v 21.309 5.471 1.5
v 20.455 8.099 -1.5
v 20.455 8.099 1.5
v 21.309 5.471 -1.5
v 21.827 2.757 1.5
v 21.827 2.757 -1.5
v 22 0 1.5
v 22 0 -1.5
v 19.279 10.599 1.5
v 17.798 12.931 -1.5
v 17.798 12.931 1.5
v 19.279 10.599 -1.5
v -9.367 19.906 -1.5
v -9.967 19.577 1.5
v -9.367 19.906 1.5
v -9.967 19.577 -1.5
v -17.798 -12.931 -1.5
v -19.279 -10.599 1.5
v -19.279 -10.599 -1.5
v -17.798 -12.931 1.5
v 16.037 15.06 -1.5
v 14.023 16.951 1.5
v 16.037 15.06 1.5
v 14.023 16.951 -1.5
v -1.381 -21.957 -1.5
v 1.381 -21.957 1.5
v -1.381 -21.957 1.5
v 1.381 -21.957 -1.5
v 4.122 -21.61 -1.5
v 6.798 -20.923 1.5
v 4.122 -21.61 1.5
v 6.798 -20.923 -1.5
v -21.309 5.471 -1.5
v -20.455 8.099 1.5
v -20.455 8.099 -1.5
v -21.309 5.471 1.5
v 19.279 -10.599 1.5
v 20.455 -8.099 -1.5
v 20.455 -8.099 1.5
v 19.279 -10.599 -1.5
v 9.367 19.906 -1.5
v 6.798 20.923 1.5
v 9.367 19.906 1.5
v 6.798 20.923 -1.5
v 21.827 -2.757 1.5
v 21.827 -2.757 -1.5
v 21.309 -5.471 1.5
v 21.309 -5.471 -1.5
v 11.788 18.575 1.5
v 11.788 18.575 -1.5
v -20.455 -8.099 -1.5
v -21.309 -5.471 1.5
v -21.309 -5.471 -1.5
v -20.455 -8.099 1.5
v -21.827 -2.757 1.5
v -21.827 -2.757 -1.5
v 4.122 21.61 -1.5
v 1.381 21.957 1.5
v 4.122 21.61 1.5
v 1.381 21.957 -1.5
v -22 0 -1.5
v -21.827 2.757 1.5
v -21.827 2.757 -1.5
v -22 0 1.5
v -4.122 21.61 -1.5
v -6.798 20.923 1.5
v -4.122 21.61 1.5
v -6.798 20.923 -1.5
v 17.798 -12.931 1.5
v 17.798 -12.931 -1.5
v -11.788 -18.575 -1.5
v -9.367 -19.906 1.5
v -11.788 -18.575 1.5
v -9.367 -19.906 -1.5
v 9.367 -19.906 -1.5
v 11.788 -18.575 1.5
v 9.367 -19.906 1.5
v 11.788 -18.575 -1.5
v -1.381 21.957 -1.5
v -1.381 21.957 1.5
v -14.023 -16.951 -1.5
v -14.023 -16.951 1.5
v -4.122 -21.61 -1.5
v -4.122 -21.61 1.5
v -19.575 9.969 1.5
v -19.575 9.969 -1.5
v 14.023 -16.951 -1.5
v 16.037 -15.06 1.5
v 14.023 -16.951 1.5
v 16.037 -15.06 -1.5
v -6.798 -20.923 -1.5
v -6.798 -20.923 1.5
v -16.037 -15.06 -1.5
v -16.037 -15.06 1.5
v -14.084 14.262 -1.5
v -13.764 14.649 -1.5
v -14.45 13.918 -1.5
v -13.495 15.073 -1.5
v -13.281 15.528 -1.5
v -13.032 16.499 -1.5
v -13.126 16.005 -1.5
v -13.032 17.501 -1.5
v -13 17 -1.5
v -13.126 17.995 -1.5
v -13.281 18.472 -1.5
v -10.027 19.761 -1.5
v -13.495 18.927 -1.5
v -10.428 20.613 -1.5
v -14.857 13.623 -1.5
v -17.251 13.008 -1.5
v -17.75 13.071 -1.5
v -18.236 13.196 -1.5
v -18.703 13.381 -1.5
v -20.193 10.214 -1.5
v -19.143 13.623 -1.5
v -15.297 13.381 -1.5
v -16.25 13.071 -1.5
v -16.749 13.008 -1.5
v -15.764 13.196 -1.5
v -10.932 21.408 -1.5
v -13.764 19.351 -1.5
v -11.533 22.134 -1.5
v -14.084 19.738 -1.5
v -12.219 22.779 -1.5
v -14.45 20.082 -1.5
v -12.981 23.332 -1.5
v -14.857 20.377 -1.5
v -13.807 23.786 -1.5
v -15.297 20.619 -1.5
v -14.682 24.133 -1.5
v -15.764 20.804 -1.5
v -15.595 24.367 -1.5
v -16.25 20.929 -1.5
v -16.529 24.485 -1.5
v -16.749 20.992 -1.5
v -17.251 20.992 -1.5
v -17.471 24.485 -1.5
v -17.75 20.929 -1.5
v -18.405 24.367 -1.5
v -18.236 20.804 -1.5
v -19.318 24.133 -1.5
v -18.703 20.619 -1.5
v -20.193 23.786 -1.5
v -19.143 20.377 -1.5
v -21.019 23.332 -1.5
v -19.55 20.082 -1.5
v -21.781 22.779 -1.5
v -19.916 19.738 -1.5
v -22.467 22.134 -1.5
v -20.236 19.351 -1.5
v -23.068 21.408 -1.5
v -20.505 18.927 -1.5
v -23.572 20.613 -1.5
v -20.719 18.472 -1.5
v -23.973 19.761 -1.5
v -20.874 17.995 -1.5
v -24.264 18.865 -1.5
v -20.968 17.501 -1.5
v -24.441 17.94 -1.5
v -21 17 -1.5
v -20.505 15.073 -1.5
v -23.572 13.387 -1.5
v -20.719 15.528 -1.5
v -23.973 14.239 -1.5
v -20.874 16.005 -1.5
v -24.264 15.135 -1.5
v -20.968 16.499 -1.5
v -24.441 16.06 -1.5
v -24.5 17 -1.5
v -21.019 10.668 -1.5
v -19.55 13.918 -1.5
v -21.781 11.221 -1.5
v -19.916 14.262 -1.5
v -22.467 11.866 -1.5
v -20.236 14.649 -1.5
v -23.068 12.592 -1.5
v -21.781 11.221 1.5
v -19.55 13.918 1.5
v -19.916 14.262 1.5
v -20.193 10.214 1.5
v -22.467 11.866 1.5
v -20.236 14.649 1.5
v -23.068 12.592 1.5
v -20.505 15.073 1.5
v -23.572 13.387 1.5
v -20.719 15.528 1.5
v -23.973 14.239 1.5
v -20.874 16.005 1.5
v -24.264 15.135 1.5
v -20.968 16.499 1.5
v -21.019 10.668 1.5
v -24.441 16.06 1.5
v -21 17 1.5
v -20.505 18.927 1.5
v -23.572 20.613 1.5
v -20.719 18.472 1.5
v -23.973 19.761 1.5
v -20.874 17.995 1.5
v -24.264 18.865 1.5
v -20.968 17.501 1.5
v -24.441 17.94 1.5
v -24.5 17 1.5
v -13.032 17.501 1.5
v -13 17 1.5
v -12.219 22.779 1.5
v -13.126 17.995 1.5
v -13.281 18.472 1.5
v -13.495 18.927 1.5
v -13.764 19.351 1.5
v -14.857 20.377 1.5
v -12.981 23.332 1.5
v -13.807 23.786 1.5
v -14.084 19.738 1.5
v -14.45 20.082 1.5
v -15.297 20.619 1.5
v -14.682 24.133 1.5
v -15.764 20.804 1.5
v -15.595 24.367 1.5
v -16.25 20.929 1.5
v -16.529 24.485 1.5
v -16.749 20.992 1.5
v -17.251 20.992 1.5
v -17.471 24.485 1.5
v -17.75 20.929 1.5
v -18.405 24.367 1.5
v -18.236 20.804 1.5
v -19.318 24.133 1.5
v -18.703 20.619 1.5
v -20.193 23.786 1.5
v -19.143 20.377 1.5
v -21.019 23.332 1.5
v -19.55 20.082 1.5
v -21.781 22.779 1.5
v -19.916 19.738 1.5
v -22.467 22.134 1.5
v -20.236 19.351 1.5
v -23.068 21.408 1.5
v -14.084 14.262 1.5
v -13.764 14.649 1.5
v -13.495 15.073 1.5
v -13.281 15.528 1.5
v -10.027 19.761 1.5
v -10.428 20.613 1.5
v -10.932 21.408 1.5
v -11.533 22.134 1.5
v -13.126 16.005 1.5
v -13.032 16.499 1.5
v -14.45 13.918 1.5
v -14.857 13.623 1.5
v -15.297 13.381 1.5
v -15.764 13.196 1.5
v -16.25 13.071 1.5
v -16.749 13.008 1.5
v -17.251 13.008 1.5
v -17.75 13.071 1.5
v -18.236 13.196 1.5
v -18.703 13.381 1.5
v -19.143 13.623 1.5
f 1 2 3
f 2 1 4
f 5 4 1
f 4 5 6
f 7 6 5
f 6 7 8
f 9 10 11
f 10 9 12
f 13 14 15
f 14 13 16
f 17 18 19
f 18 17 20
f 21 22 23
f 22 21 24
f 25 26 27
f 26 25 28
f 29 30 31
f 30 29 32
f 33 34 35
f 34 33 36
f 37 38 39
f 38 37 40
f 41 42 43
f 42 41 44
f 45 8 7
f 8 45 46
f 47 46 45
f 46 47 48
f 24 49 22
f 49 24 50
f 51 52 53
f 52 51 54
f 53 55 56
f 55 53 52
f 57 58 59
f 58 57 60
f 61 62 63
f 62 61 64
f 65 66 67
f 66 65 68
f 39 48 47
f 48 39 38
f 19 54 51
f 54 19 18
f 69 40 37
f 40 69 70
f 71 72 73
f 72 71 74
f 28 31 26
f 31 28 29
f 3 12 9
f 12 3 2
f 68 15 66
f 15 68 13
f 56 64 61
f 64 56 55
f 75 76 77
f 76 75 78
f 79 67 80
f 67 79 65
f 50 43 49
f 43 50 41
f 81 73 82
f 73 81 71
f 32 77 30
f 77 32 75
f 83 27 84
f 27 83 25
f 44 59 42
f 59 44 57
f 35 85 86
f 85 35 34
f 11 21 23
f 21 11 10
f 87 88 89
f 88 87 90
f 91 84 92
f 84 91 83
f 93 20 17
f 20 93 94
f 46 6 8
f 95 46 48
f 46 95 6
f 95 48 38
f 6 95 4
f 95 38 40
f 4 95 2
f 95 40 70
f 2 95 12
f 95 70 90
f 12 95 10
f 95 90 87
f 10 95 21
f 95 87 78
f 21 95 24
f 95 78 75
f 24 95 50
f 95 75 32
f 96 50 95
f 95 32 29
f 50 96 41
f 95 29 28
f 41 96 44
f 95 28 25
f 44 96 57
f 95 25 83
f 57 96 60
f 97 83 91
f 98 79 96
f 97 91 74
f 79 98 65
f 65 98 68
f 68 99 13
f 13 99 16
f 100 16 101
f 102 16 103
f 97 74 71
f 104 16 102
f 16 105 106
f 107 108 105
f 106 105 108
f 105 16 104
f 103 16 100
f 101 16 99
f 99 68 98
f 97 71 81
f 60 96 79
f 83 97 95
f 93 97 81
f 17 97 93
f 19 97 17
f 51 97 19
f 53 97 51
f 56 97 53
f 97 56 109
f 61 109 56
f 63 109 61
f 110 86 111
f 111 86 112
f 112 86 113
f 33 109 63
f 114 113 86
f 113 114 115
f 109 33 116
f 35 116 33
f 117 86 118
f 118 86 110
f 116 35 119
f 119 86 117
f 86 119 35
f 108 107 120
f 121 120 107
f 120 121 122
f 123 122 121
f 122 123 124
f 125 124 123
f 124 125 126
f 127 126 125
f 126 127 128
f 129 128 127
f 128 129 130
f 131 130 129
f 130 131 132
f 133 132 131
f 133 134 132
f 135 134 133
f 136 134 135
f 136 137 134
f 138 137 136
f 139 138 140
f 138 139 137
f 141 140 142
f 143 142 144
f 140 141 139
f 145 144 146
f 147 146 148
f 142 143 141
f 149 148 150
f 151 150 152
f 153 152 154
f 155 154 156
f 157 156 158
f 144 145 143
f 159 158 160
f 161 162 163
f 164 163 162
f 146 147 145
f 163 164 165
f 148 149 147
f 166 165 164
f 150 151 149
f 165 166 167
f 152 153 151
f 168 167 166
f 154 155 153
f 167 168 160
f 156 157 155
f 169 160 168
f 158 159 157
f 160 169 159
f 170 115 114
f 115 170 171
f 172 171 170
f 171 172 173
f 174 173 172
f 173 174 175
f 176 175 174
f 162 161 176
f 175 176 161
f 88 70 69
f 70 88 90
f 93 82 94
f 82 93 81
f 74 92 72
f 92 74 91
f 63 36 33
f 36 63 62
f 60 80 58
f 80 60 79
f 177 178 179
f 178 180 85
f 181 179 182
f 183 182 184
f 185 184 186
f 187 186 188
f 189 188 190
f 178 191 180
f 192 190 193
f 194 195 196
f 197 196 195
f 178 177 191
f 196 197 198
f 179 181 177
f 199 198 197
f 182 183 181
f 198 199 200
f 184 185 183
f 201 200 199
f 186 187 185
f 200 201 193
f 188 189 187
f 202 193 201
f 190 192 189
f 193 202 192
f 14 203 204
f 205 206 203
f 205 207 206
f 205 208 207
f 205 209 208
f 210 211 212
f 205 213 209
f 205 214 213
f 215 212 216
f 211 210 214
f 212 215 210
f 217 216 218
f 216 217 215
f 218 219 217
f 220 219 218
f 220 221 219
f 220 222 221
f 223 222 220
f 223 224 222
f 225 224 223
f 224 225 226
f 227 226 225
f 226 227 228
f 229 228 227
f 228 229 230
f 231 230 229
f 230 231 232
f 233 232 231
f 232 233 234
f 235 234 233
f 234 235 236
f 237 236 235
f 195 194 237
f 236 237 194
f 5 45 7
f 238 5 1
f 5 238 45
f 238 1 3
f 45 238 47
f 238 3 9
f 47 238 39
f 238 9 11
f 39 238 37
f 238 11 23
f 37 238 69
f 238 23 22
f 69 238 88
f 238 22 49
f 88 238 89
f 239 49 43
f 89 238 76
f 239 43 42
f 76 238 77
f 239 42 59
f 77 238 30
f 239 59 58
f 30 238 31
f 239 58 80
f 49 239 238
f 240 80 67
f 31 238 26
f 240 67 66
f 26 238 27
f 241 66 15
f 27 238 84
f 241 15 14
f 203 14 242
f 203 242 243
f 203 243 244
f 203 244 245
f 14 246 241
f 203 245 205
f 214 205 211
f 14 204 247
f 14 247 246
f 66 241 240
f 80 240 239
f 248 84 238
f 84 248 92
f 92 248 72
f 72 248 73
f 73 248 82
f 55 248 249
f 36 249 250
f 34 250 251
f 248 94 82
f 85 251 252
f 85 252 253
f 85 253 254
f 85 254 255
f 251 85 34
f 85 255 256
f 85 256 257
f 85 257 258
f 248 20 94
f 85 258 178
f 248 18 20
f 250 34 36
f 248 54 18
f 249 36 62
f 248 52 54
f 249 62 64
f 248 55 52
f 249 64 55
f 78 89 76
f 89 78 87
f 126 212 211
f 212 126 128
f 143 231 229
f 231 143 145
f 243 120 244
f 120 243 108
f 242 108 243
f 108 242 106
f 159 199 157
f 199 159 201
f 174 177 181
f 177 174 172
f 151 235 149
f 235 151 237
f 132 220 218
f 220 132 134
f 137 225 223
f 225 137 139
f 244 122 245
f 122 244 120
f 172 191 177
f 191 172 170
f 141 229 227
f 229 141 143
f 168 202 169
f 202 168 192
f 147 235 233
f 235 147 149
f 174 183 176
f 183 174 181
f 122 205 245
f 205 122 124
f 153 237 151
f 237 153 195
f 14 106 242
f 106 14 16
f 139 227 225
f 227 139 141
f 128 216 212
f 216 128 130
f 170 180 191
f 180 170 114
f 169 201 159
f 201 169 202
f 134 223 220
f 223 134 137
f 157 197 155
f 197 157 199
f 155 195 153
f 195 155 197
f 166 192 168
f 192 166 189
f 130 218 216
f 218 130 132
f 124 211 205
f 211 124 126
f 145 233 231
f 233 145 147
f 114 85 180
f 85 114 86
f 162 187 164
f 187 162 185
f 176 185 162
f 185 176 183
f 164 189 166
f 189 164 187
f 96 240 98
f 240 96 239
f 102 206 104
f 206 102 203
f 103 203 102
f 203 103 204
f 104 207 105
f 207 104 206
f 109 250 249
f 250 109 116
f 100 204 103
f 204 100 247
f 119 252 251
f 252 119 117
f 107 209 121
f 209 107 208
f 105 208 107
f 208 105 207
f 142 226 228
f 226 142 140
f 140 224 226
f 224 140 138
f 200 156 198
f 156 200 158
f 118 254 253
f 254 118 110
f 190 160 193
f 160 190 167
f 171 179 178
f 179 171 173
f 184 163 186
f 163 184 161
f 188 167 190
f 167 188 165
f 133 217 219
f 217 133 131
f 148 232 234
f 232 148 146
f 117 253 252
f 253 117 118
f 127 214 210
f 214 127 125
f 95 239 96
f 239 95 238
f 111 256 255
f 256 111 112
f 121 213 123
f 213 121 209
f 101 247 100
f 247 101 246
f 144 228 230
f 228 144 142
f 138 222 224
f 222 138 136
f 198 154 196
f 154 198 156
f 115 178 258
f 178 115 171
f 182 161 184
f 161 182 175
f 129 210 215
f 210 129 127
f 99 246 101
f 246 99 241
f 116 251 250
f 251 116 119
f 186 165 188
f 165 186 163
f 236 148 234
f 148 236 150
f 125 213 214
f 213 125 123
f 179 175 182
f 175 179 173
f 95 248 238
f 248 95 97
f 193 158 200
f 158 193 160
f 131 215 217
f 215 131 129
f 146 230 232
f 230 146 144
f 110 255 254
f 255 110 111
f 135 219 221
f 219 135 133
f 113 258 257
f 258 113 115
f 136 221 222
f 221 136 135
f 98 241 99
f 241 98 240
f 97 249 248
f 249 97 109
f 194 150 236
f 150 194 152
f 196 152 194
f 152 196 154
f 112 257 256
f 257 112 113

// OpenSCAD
$fn = 50;


difference() {
	union() {
		translate(v = [0, 0, -1.5000000000]) {
			cylinder(h = 3, r = 22.0000000000);
		}
		translate(v = [-17, 17, -1.5000000000]) {
			cylinder(h = 3, r = 7.5000000000);
		}
		#translate(v = [-17, 17, 3]) {
			linear_extrude(height = 3) {
				text(font = "Candara:Light", halign = "center", size = 7, text = "", valign = "center");
			}
		}
	}
	union() {
		translate(v = [-17, 17, -1.5000000000]) {
			cylinder(h = 3, r = 4.0000000000);
		}
	}
}
